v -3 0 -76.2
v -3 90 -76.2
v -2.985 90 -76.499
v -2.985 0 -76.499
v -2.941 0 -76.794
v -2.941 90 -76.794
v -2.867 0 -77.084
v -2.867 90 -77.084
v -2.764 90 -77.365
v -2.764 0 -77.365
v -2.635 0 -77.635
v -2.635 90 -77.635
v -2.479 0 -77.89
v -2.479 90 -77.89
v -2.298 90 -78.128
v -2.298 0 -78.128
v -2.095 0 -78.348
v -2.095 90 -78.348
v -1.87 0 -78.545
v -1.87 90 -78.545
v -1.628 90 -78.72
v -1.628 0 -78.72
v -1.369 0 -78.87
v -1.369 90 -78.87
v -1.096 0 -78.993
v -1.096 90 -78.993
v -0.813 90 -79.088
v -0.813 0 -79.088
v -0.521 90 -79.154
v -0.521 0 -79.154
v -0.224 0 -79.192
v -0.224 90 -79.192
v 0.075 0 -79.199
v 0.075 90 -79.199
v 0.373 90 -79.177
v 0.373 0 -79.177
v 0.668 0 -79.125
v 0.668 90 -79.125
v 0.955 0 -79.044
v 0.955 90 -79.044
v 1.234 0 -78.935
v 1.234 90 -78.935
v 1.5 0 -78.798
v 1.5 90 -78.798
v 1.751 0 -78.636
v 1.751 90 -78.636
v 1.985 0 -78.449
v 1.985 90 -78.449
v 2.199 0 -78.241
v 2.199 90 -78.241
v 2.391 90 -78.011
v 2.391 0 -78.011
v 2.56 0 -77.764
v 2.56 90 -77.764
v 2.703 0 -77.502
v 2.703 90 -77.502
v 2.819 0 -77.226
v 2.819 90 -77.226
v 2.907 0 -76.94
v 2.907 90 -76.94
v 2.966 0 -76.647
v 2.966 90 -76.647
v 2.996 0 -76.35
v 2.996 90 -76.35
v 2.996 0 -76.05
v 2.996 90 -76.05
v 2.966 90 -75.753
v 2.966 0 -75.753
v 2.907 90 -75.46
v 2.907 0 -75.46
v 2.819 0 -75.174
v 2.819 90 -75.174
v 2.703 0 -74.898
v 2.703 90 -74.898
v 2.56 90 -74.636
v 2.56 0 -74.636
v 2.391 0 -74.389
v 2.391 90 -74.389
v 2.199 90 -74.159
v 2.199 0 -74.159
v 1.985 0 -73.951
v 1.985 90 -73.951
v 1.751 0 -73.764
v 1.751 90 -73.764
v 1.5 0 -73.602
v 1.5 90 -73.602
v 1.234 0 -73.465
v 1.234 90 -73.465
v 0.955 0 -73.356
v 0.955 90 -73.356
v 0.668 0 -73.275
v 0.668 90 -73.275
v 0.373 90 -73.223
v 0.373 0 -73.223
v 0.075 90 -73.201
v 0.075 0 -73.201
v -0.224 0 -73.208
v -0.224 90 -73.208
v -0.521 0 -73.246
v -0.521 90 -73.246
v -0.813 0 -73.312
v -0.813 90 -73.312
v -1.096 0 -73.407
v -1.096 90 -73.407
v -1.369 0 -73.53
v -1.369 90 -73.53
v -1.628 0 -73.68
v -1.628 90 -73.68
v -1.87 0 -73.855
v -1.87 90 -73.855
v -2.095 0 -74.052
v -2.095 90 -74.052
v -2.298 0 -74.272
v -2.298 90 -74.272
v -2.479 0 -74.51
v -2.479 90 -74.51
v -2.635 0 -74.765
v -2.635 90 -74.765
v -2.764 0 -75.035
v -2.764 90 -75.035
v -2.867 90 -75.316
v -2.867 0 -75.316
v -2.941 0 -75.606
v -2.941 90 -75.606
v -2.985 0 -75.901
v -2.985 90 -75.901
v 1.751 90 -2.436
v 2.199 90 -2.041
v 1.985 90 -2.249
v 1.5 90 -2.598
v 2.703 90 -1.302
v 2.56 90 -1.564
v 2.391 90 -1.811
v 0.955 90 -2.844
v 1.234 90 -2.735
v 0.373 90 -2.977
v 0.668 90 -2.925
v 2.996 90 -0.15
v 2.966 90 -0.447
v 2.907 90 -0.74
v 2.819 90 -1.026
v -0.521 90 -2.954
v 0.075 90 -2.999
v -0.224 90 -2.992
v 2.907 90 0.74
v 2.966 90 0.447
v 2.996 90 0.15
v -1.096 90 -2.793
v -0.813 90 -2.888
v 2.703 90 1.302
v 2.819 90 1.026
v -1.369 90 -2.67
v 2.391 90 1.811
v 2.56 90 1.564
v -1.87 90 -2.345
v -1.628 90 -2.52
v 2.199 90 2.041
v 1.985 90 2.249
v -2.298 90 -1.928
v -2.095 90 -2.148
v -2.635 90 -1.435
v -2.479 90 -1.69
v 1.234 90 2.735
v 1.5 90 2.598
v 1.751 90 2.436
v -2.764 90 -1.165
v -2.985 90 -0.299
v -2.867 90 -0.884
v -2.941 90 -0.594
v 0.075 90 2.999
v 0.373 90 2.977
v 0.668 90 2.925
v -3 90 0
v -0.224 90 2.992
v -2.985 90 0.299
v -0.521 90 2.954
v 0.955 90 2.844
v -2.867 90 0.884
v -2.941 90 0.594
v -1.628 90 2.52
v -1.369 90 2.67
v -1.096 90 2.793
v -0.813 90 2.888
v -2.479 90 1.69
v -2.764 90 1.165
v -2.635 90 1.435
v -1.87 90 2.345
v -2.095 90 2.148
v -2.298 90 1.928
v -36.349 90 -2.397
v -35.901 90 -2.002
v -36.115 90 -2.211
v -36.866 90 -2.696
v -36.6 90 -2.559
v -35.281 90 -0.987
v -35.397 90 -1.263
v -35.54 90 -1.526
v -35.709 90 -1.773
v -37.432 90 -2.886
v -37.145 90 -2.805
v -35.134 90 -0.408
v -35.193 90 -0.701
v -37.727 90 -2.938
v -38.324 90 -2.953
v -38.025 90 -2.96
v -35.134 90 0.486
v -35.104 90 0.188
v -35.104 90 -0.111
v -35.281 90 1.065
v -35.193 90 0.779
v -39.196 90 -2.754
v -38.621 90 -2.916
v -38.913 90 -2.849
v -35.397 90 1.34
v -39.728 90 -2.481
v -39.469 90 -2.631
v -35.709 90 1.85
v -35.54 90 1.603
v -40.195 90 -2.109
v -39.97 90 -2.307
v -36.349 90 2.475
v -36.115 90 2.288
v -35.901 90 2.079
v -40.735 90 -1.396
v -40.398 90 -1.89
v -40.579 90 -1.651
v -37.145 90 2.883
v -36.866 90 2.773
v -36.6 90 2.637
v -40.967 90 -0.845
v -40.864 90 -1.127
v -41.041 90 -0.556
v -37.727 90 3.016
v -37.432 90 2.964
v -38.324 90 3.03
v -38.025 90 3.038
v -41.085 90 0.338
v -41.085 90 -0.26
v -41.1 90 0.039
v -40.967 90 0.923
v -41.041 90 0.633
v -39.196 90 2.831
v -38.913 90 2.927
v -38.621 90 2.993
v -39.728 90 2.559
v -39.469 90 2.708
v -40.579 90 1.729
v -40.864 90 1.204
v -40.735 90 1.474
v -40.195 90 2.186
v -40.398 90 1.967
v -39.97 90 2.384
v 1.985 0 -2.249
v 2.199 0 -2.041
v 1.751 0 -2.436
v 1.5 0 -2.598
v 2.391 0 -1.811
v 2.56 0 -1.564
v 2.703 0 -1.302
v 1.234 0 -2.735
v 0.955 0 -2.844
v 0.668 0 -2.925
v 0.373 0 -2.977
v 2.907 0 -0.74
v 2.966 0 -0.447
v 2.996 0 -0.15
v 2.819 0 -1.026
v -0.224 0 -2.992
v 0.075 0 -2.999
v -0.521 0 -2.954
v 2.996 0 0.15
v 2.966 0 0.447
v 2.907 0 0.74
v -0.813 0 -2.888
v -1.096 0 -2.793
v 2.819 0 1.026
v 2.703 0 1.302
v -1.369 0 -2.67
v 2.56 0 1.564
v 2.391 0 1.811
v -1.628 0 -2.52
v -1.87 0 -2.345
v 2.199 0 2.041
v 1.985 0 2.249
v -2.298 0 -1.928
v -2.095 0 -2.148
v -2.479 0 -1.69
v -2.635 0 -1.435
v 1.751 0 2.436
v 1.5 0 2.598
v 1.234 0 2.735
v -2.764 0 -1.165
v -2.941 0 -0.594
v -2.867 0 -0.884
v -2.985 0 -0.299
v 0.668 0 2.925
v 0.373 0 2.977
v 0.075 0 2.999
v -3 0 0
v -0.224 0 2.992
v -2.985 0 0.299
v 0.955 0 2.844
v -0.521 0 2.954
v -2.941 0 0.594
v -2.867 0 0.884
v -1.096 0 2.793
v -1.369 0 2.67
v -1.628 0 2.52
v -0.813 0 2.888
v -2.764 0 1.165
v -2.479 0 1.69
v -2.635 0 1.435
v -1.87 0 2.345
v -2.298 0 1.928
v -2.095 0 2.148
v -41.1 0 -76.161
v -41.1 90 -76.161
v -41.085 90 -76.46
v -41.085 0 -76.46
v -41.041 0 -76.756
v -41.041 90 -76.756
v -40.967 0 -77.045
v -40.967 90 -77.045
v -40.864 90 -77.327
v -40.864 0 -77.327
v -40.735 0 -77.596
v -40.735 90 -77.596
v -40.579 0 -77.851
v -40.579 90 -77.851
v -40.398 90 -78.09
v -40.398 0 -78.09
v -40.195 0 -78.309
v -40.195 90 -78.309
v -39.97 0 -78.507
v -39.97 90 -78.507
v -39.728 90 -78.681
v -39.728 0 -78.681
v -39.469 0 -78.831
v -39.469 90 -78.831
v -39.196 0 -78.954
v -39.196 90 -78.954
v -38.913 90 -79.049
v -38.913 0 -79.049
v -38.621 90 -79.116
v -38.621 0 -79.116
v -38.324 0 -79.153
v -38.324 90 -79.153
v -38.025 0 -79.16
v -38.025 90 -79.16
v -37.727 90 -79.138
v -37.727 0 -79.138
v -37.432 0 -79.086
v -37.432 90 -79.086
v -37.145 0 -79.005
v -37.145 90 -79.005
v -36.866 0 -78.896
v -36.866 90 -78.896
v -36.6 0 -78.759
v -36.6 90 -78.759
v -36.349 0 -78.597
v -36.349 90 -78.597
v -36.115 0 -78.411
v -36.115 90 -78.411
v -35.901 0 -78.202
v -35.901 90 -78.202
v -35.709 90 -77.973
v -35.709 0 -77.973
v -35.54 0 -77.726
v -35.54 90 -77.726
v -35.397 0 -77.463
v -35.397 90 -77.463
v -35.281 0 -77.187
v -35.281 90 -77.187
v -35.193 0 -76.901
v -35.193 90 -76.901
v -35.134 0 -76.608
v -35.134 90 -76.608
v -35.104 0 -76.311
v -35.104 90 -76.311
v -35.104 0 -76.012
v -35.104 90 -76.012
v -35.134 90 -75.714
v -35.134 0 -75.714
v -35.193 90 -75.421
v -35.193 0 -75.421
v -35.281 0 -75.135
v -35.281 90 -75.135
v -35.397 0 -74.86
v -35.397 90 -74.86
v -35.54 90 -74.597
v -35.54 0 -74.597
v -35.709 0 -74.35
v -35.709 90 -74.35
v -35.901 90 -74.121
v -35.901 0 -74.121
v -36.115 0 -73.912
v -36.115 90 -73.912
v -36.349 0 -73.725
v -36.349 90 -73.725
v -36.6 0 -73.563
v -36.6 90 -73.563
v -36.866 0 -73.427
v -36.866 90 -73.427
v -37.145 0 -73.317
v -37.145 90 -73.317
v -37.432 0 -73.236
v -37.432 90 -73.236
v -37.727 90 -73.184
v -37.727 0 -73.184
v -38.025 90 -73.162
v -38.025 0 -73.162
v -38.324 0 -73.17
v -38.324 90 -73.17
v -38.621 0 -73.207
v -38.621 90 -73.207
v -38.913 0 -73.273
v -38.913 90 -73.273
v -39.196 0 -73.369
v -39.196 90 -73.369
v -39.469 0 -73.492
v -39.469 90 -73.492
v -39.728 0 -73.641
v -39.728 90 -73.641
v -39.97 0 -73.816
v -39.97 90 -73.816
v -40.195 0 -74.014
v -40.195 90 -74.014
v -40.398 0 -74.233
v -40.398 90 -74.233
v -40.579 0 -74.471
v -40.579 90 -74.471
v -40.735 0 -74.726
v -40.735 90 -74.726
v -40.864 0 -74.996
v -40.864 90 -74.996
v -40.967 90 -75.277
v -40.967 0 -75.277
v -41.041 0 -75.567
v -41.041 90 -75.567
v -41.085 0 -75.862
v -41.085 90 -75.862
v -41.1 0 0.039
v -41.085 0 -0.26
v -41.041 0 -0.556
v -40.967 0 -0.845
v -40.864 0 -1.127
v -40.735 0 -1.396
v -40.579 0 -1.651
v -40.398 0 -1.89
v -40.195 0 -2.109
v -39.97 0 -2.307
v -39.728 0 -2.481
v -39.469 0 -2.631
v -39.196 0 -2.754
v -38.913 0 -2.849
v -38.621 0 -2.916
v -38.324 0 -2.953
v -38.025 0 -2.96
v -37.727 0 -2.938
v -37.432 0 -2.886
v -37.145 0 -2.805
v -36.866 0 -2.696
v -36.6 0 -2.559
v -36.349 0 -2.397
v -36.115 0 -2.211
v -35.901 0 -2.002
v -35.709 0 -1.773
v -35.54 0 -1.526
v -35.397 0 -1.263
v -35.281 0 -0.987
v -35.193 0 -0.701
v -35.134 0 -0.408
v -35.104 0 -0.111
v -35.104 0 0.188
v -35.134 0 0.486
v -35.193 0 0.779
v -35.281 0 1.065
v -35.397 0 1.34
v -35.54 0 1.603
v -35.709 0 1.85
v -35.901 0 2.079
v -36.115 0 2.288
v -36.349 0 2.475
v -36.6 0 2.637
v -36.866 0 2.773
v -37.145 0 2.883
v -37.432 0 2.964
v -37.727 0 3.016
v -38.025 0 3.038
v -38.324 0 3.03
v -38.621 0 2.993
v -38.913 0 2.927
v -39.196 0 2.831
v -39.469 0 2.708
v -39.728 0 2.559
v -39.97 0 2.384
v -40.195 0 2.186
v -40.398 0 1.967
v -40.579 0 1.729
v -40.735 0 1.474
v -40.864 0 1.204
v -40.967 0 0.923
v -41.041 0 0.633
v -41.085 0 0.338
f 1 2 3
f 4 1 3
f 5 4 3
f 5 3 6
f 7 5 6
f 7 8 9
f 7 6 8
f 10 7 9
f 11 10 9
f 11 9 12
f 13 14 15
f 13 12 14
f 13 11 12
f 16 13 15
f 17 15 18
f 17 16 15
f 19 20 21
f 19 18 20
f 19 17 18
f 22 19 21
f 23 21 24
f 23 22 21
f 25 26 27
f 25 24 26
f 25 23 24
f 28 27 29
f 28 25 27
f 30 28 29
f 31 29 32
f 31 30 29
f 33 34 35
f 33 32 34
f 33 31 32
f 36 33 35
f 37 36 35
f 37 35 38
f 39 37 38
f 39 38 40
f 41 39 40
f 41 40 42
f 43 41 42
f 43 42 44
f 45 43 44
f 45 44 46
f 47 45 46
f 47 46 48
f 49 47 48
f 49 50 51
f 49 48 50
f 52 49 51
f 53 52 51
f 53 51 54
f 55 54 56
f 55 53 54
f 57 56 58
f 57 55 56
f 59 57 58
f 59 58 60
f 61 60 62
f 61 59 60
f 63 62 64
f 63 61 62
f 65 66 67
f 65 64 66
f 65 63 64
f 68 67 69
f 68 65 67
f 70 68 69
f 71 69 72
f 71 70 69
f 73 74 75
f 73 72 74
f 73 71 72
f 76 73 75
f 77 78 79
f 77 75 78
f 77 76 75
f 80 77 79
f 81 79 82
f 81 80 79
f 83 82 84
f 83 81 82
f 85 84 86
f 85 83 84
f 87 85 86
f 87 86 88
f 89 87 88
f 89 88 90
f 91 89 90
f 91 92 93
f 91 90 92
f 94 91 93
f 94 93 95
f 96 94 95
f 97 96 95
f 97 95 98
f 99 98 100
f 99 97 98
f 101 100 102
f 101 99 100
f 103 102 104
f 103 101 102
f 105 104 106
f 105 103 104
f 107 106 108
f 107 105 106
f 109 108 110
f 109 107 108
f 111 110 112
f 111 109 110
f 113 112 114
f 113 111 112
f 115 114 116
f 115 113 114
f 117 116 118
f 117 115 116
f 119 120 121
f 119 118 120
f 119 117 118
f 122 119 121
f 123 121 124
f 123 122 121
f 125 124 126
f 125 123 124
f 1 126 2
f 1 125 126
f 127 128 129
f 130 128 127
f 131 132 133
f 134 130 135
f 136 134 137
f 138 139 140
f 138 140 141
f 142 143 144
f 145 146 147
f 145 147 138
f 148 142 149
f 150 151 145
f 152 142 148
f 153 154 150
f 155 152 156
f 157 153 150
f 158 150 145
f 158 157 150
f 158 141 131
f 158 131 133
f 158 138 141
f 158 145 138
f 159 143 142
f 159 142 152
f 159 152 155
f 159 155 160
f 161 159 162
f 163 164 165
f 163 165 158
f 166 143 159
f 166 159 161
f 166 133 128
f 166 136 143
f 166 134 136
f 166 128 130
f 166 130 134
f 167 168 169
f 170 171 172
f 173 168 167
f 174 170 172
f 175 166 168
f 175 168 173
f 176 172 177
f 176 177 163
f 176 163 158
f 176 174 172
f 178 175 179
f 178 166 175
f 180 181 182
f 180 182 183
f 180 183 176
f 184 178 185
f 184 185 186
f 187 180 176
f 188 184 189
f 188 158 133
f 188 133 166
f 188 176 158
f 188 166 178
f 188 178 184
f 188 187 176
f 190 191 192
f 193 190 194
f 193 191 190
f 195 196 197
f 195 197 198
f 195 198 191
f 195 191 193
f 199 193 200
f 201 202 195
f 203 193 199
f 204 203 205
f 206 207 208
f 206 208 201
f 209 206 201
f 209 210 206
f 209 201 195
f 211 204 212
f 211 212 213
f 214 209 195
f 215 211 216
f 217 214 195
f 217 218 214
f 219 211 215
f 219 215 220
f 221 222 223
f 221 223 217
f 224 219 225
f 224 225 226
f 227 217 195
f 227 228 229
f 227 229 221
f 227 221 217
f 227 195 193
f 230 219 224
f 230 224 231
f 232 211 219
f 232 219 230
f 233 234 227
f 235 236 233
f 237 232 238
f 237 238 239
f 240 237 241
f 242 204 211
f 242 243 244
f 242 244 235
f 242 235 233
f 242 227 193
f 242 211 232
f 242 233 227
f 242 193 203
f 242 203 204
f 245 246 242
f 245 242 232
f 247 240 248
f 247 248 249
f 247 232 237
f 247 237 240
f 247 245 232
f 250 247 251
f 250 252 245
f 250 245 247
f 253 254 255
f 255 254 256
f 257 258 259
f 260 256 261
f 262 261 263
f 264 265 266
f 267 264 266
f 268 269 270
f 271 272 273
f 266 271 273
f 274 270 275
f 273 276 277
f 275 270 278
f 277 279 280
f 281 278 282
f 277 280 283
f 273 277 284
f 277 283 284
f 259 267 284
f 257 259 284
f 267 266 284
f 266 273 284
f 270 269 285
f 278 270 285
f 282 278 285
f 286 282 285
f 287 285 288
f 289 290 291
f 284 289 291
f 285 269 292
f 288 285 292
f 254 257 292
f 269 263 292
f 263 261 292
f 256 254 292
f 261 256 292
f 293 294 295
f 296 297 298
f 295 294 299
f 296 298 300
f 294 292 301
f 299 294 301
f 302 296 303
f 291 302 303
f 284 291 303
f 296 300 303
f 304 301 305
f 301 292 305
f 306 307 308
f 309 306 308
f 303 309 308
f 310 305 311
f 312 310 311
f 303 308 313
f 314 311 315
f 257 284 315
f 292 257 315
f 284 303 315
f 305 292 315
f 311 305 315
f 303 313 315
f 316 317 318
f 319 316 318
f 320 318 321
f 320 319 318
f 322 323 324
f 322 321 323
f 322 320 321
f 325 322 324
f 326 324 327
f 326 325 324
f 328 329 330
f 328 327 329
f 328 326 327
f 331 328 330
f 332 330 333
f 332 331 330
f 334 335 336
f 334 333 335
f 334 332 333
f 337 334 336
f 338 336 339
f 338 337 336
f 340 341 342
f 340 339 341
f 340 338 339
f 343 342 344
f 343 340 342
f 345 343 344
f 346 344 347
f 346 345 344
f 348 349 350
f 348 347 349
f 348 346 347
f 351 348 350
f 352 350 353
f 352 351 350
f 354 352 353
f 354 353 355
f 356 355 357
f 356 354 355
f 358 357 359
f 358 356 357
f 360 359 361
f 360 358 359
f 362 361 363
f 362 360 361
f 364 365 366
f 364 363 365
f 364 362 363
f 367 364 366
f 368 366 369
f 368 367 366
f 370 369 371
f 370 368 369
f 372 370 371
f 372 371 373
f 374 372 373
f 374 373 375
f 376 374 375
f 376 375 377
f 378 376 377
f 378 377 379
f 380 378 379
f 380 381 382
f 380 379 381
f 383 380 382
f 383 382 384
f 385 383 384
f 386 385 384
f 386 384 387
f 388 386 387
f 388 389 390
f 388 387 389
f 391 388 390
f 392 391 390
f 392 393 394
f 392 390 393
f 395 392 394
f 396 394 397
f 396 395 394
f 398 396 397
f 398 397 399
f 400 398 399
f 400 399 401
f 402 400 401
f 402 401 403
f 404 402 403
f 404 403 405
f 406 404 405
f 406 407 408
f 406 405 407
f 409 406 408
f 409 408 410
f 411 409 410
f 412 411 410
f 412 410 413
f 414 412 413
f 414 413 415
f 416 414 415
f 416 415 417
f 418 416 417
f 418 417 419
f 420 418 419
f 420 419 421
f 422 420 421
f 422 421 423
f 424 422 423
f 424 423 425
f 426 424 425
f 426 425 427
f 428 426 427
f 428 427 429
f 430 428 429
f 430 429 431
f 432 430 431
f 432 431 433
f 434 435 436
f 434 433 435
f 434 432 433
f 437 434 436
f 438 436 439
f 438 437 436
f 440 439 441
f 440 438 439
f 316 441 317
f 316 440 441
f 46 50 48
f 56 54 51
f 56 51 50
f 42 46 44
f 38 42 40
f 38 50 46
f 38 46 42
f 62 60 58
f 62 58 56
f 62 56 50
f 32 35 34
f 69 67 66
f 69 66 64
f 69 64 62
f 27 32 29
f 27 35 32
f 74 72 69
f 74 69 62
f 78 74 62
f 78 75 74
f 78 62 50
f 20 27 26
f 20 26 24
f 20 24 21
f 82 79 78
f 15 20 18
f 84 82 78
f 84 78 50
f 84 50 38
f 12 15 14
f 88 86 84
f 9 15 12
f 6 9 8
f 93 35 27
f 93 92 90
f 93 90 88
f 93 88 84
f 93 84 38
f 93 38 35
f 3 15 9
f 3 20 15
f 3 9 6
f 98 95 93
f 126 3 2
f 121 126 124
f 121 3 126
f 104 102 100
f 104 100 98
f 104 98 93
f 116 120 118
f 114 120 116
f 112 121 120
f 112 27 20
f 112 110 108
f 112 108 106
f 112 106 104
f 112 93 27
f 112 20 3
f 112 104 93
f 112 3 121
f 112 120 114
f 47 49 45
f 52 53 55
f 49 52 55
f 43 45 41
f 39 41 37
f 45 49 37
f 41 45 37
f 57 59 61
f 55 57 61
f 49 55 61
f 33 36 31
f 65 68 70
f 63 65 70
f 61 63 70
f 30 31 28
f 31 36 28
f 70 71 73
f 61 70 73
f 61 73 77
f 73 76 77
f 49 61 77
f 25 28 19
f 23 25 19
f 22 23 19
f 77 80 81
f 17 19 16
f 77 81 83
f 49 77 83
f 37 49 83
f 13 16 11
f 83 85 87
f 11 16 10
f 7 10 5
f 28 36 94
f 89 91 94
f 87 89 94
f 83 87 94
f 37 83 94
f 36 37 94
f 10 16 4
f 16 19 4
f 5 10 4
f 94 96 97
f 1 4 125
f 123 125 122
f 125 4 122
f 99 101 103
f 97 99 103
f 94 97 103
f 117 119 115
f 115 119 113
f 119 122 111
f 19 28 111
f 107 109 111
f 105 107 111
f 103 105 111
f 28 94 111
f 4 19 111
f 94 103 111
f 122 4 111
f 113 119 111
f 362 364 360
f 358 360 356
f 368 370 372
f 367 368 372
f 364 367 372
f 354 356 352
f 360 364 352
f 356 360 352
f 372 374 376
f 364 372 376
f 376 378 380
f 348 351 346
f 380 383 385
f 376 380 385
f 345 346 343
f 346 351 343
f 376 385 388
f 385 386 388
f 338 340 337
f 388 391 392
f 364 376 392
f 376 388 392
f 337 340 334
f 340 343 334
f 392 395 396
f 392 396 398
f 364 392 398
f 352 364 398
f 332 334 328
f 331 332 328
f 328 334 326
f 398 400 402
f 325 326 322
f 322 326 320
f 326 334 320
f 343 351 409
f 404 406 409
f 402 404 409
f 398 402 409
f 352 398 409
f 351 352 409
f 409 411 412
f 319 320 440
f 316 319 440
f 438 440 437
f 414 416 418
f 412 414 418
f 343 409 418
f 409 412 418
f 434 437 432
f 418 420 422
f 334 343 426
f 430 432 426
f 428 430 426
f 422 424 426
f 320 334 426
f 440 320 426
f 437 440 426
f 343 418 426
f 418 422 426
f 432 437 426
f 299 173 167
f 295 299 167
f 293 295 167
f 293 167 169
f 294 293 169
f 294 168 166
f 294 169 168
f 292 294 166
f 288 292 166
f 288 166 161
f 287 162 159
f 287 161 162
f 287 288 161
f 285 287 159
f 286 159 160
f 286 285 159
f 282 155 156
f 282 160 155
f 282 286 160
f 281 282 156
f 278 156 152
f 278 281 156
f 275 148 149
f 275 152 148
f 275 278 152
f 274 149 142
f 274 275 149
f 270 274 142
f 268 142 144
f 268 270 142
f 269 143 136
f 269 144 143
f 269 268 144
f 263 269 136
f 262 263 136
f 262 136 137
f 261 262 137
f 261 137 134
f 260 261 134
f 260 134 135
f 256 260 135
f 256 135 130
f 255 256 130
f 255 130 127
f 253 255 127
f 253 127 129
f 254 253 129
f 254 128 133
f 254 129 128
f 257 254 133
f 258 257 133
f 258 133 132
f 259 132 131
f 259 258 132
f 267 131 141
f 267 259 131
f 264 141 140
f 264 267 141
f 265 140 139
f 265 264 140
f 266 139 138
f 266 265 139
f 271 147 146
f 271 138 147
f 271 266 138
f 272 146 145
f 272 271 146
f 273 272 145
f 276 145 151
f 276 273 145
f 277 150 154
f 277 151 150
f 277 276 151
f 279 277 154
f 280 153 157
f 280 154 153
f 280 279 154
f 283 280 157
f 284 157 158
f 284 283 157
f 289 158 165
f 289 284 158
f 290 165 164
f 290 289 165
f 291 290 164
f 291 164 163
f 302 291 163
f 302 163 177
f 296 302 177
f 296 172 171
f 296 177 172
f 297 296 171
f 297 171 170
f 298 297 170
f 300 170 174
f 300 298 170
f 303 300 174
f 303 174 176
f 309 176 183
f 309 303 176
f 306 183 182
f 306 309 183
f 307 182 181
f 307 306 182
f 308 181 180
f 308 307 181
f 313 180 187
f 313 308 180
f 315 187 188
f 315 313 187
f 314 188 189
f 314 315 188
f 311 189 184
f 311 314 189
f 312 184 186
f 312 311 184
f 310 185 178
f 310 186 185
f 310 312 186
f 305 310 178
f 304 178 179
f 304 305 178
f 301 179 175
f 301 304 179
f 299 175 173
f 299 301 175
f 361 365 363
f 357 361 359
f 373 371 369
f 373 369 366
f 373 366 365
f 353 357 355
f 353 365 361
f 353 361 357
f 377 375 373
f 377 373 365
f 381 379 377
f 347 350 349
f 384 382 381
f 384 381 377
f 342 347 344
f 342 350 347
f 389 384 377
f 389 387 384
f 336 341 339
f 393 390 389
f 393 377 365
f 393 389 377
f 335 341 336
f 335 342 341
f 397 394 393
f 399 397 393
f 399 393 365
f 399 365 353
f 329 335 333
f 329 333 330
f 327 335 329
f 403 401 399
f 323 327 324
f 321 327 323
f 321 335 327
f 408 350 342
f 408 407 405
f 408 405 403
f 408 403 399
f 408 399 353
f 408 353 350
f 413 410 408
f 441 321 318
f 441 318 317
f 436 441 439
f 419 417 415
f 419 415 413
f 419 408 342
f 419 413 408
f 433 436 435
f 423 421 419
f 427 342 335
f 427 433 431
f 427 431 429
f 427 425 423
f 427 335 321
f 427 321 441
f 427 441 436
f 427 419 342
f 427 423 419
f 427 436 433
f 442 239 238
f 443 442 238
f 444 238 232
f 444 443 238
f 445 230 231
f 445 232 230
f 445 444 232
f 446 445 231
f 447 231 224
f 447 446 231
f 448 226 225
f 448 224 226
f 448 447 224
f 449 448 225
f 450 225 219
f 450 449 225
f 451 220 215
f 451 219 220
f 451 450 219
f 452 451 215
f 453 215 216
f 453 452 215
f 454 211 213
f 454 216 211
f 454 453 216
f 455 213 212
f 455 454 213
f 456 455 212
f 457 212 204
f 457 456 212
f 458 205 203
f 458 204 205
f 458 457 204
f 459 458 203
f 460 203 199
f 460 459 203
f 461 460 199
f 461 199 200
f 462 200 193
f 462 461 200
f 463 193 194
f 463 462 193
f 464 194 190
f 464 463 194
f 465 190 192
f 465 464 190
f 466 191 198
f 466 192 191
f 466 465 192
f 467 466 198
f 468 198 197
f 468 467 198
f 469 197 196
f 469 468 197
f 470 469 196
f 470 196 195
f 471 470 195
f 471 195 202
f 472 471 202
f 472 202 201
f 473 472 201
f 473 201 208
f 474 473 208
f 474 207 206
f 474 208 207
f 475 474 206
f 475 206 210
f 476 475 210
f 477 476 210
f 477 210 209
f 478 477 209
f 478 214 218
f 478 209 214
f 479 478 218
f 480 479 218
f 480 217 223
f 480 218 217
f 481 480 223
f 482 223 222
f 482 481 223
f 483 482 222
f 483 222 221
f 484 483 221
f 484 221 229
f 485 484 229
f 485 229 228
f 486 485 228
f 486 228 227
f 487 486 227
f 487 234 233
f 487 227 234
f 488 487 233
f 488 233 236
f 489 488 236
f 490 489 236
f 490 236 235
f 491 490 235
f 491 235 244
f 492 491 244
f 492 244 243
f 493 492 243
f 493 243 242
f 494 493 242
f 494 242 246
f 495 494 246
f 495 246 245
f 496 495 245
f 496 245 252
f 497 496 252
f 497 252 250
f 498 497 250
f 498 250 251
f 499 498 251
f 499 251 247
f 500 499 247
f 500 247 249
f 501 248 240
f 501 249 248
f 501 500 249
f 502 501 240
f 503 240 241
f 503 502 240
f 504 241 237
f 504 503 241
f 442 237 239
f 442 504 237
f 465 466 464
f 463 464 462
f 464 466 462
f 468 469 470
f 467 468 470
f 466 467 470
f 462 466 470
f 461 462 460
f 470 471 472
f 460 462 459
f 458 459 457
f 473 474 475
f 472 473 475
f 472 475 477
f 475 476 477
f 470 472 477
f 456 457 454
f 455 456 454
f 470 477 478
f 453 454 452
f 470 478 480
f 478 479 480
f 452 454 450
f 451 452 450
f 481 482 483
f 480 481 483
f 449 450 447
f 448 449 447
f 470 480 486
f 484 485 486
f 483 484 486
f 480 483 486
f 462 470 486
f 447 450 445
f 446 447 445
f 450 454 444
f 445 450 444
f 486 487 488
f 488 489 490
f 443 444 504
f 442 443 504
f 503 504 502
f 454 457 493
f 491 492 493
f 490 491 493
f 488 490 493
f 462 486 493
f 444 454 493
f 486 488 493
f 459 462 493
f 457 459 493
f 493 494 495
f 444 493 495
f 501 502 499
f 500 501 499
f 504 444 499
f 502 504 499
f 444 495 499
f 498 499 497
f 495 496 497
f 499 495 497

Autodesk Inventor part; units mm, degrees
ref_plane "YZ Plane" through (0, 0, 0) normal (1, 0, 0) x (0, 1, 0)
ref_plane "XZ Plane" through (0, 0, 0) normal (0, 1, 0) x (-1, 0, 0)
ref_plane "XY Plane" through (0, 0, 0) normal (0, 0, 1) x (1, 0, 0)
sketch "Sketch1" plane through (0, 0, 0) normal (0, 1, 0) x (-1, 0, 0)
  circle A0 centre (0, 0) radius 3
  circle A1 centre (38.1, 0.0388) radius 3
  circle A2 centre (0, -76.2) radius 3
  circle A3 centre (38.1, -76.1612) radius 3
  line L0 (0, 0) -> (39.4176, 0) construction
  dimension "d0" = 6
  dimension "d3" = 6
  dimension "d4" = 6
  dimension "d5" = 6
  dimension "d6" = 38.1
  dimension "d7" = 76.2
  dimension "d8" = 38.1
  dimension "d9" = 76.2
extrude "Extrusion2" add sketch "Sketch1" along normal blind 90
equation "\"d3\" = d0"
equation "\"d4\" = d3"
equation "\"d5\" = d4"
equation "\"d7\" = 2 * d6"
equation "\"d8\" = d6"
equation "\"d9\" = d7"
properties part number "table"
